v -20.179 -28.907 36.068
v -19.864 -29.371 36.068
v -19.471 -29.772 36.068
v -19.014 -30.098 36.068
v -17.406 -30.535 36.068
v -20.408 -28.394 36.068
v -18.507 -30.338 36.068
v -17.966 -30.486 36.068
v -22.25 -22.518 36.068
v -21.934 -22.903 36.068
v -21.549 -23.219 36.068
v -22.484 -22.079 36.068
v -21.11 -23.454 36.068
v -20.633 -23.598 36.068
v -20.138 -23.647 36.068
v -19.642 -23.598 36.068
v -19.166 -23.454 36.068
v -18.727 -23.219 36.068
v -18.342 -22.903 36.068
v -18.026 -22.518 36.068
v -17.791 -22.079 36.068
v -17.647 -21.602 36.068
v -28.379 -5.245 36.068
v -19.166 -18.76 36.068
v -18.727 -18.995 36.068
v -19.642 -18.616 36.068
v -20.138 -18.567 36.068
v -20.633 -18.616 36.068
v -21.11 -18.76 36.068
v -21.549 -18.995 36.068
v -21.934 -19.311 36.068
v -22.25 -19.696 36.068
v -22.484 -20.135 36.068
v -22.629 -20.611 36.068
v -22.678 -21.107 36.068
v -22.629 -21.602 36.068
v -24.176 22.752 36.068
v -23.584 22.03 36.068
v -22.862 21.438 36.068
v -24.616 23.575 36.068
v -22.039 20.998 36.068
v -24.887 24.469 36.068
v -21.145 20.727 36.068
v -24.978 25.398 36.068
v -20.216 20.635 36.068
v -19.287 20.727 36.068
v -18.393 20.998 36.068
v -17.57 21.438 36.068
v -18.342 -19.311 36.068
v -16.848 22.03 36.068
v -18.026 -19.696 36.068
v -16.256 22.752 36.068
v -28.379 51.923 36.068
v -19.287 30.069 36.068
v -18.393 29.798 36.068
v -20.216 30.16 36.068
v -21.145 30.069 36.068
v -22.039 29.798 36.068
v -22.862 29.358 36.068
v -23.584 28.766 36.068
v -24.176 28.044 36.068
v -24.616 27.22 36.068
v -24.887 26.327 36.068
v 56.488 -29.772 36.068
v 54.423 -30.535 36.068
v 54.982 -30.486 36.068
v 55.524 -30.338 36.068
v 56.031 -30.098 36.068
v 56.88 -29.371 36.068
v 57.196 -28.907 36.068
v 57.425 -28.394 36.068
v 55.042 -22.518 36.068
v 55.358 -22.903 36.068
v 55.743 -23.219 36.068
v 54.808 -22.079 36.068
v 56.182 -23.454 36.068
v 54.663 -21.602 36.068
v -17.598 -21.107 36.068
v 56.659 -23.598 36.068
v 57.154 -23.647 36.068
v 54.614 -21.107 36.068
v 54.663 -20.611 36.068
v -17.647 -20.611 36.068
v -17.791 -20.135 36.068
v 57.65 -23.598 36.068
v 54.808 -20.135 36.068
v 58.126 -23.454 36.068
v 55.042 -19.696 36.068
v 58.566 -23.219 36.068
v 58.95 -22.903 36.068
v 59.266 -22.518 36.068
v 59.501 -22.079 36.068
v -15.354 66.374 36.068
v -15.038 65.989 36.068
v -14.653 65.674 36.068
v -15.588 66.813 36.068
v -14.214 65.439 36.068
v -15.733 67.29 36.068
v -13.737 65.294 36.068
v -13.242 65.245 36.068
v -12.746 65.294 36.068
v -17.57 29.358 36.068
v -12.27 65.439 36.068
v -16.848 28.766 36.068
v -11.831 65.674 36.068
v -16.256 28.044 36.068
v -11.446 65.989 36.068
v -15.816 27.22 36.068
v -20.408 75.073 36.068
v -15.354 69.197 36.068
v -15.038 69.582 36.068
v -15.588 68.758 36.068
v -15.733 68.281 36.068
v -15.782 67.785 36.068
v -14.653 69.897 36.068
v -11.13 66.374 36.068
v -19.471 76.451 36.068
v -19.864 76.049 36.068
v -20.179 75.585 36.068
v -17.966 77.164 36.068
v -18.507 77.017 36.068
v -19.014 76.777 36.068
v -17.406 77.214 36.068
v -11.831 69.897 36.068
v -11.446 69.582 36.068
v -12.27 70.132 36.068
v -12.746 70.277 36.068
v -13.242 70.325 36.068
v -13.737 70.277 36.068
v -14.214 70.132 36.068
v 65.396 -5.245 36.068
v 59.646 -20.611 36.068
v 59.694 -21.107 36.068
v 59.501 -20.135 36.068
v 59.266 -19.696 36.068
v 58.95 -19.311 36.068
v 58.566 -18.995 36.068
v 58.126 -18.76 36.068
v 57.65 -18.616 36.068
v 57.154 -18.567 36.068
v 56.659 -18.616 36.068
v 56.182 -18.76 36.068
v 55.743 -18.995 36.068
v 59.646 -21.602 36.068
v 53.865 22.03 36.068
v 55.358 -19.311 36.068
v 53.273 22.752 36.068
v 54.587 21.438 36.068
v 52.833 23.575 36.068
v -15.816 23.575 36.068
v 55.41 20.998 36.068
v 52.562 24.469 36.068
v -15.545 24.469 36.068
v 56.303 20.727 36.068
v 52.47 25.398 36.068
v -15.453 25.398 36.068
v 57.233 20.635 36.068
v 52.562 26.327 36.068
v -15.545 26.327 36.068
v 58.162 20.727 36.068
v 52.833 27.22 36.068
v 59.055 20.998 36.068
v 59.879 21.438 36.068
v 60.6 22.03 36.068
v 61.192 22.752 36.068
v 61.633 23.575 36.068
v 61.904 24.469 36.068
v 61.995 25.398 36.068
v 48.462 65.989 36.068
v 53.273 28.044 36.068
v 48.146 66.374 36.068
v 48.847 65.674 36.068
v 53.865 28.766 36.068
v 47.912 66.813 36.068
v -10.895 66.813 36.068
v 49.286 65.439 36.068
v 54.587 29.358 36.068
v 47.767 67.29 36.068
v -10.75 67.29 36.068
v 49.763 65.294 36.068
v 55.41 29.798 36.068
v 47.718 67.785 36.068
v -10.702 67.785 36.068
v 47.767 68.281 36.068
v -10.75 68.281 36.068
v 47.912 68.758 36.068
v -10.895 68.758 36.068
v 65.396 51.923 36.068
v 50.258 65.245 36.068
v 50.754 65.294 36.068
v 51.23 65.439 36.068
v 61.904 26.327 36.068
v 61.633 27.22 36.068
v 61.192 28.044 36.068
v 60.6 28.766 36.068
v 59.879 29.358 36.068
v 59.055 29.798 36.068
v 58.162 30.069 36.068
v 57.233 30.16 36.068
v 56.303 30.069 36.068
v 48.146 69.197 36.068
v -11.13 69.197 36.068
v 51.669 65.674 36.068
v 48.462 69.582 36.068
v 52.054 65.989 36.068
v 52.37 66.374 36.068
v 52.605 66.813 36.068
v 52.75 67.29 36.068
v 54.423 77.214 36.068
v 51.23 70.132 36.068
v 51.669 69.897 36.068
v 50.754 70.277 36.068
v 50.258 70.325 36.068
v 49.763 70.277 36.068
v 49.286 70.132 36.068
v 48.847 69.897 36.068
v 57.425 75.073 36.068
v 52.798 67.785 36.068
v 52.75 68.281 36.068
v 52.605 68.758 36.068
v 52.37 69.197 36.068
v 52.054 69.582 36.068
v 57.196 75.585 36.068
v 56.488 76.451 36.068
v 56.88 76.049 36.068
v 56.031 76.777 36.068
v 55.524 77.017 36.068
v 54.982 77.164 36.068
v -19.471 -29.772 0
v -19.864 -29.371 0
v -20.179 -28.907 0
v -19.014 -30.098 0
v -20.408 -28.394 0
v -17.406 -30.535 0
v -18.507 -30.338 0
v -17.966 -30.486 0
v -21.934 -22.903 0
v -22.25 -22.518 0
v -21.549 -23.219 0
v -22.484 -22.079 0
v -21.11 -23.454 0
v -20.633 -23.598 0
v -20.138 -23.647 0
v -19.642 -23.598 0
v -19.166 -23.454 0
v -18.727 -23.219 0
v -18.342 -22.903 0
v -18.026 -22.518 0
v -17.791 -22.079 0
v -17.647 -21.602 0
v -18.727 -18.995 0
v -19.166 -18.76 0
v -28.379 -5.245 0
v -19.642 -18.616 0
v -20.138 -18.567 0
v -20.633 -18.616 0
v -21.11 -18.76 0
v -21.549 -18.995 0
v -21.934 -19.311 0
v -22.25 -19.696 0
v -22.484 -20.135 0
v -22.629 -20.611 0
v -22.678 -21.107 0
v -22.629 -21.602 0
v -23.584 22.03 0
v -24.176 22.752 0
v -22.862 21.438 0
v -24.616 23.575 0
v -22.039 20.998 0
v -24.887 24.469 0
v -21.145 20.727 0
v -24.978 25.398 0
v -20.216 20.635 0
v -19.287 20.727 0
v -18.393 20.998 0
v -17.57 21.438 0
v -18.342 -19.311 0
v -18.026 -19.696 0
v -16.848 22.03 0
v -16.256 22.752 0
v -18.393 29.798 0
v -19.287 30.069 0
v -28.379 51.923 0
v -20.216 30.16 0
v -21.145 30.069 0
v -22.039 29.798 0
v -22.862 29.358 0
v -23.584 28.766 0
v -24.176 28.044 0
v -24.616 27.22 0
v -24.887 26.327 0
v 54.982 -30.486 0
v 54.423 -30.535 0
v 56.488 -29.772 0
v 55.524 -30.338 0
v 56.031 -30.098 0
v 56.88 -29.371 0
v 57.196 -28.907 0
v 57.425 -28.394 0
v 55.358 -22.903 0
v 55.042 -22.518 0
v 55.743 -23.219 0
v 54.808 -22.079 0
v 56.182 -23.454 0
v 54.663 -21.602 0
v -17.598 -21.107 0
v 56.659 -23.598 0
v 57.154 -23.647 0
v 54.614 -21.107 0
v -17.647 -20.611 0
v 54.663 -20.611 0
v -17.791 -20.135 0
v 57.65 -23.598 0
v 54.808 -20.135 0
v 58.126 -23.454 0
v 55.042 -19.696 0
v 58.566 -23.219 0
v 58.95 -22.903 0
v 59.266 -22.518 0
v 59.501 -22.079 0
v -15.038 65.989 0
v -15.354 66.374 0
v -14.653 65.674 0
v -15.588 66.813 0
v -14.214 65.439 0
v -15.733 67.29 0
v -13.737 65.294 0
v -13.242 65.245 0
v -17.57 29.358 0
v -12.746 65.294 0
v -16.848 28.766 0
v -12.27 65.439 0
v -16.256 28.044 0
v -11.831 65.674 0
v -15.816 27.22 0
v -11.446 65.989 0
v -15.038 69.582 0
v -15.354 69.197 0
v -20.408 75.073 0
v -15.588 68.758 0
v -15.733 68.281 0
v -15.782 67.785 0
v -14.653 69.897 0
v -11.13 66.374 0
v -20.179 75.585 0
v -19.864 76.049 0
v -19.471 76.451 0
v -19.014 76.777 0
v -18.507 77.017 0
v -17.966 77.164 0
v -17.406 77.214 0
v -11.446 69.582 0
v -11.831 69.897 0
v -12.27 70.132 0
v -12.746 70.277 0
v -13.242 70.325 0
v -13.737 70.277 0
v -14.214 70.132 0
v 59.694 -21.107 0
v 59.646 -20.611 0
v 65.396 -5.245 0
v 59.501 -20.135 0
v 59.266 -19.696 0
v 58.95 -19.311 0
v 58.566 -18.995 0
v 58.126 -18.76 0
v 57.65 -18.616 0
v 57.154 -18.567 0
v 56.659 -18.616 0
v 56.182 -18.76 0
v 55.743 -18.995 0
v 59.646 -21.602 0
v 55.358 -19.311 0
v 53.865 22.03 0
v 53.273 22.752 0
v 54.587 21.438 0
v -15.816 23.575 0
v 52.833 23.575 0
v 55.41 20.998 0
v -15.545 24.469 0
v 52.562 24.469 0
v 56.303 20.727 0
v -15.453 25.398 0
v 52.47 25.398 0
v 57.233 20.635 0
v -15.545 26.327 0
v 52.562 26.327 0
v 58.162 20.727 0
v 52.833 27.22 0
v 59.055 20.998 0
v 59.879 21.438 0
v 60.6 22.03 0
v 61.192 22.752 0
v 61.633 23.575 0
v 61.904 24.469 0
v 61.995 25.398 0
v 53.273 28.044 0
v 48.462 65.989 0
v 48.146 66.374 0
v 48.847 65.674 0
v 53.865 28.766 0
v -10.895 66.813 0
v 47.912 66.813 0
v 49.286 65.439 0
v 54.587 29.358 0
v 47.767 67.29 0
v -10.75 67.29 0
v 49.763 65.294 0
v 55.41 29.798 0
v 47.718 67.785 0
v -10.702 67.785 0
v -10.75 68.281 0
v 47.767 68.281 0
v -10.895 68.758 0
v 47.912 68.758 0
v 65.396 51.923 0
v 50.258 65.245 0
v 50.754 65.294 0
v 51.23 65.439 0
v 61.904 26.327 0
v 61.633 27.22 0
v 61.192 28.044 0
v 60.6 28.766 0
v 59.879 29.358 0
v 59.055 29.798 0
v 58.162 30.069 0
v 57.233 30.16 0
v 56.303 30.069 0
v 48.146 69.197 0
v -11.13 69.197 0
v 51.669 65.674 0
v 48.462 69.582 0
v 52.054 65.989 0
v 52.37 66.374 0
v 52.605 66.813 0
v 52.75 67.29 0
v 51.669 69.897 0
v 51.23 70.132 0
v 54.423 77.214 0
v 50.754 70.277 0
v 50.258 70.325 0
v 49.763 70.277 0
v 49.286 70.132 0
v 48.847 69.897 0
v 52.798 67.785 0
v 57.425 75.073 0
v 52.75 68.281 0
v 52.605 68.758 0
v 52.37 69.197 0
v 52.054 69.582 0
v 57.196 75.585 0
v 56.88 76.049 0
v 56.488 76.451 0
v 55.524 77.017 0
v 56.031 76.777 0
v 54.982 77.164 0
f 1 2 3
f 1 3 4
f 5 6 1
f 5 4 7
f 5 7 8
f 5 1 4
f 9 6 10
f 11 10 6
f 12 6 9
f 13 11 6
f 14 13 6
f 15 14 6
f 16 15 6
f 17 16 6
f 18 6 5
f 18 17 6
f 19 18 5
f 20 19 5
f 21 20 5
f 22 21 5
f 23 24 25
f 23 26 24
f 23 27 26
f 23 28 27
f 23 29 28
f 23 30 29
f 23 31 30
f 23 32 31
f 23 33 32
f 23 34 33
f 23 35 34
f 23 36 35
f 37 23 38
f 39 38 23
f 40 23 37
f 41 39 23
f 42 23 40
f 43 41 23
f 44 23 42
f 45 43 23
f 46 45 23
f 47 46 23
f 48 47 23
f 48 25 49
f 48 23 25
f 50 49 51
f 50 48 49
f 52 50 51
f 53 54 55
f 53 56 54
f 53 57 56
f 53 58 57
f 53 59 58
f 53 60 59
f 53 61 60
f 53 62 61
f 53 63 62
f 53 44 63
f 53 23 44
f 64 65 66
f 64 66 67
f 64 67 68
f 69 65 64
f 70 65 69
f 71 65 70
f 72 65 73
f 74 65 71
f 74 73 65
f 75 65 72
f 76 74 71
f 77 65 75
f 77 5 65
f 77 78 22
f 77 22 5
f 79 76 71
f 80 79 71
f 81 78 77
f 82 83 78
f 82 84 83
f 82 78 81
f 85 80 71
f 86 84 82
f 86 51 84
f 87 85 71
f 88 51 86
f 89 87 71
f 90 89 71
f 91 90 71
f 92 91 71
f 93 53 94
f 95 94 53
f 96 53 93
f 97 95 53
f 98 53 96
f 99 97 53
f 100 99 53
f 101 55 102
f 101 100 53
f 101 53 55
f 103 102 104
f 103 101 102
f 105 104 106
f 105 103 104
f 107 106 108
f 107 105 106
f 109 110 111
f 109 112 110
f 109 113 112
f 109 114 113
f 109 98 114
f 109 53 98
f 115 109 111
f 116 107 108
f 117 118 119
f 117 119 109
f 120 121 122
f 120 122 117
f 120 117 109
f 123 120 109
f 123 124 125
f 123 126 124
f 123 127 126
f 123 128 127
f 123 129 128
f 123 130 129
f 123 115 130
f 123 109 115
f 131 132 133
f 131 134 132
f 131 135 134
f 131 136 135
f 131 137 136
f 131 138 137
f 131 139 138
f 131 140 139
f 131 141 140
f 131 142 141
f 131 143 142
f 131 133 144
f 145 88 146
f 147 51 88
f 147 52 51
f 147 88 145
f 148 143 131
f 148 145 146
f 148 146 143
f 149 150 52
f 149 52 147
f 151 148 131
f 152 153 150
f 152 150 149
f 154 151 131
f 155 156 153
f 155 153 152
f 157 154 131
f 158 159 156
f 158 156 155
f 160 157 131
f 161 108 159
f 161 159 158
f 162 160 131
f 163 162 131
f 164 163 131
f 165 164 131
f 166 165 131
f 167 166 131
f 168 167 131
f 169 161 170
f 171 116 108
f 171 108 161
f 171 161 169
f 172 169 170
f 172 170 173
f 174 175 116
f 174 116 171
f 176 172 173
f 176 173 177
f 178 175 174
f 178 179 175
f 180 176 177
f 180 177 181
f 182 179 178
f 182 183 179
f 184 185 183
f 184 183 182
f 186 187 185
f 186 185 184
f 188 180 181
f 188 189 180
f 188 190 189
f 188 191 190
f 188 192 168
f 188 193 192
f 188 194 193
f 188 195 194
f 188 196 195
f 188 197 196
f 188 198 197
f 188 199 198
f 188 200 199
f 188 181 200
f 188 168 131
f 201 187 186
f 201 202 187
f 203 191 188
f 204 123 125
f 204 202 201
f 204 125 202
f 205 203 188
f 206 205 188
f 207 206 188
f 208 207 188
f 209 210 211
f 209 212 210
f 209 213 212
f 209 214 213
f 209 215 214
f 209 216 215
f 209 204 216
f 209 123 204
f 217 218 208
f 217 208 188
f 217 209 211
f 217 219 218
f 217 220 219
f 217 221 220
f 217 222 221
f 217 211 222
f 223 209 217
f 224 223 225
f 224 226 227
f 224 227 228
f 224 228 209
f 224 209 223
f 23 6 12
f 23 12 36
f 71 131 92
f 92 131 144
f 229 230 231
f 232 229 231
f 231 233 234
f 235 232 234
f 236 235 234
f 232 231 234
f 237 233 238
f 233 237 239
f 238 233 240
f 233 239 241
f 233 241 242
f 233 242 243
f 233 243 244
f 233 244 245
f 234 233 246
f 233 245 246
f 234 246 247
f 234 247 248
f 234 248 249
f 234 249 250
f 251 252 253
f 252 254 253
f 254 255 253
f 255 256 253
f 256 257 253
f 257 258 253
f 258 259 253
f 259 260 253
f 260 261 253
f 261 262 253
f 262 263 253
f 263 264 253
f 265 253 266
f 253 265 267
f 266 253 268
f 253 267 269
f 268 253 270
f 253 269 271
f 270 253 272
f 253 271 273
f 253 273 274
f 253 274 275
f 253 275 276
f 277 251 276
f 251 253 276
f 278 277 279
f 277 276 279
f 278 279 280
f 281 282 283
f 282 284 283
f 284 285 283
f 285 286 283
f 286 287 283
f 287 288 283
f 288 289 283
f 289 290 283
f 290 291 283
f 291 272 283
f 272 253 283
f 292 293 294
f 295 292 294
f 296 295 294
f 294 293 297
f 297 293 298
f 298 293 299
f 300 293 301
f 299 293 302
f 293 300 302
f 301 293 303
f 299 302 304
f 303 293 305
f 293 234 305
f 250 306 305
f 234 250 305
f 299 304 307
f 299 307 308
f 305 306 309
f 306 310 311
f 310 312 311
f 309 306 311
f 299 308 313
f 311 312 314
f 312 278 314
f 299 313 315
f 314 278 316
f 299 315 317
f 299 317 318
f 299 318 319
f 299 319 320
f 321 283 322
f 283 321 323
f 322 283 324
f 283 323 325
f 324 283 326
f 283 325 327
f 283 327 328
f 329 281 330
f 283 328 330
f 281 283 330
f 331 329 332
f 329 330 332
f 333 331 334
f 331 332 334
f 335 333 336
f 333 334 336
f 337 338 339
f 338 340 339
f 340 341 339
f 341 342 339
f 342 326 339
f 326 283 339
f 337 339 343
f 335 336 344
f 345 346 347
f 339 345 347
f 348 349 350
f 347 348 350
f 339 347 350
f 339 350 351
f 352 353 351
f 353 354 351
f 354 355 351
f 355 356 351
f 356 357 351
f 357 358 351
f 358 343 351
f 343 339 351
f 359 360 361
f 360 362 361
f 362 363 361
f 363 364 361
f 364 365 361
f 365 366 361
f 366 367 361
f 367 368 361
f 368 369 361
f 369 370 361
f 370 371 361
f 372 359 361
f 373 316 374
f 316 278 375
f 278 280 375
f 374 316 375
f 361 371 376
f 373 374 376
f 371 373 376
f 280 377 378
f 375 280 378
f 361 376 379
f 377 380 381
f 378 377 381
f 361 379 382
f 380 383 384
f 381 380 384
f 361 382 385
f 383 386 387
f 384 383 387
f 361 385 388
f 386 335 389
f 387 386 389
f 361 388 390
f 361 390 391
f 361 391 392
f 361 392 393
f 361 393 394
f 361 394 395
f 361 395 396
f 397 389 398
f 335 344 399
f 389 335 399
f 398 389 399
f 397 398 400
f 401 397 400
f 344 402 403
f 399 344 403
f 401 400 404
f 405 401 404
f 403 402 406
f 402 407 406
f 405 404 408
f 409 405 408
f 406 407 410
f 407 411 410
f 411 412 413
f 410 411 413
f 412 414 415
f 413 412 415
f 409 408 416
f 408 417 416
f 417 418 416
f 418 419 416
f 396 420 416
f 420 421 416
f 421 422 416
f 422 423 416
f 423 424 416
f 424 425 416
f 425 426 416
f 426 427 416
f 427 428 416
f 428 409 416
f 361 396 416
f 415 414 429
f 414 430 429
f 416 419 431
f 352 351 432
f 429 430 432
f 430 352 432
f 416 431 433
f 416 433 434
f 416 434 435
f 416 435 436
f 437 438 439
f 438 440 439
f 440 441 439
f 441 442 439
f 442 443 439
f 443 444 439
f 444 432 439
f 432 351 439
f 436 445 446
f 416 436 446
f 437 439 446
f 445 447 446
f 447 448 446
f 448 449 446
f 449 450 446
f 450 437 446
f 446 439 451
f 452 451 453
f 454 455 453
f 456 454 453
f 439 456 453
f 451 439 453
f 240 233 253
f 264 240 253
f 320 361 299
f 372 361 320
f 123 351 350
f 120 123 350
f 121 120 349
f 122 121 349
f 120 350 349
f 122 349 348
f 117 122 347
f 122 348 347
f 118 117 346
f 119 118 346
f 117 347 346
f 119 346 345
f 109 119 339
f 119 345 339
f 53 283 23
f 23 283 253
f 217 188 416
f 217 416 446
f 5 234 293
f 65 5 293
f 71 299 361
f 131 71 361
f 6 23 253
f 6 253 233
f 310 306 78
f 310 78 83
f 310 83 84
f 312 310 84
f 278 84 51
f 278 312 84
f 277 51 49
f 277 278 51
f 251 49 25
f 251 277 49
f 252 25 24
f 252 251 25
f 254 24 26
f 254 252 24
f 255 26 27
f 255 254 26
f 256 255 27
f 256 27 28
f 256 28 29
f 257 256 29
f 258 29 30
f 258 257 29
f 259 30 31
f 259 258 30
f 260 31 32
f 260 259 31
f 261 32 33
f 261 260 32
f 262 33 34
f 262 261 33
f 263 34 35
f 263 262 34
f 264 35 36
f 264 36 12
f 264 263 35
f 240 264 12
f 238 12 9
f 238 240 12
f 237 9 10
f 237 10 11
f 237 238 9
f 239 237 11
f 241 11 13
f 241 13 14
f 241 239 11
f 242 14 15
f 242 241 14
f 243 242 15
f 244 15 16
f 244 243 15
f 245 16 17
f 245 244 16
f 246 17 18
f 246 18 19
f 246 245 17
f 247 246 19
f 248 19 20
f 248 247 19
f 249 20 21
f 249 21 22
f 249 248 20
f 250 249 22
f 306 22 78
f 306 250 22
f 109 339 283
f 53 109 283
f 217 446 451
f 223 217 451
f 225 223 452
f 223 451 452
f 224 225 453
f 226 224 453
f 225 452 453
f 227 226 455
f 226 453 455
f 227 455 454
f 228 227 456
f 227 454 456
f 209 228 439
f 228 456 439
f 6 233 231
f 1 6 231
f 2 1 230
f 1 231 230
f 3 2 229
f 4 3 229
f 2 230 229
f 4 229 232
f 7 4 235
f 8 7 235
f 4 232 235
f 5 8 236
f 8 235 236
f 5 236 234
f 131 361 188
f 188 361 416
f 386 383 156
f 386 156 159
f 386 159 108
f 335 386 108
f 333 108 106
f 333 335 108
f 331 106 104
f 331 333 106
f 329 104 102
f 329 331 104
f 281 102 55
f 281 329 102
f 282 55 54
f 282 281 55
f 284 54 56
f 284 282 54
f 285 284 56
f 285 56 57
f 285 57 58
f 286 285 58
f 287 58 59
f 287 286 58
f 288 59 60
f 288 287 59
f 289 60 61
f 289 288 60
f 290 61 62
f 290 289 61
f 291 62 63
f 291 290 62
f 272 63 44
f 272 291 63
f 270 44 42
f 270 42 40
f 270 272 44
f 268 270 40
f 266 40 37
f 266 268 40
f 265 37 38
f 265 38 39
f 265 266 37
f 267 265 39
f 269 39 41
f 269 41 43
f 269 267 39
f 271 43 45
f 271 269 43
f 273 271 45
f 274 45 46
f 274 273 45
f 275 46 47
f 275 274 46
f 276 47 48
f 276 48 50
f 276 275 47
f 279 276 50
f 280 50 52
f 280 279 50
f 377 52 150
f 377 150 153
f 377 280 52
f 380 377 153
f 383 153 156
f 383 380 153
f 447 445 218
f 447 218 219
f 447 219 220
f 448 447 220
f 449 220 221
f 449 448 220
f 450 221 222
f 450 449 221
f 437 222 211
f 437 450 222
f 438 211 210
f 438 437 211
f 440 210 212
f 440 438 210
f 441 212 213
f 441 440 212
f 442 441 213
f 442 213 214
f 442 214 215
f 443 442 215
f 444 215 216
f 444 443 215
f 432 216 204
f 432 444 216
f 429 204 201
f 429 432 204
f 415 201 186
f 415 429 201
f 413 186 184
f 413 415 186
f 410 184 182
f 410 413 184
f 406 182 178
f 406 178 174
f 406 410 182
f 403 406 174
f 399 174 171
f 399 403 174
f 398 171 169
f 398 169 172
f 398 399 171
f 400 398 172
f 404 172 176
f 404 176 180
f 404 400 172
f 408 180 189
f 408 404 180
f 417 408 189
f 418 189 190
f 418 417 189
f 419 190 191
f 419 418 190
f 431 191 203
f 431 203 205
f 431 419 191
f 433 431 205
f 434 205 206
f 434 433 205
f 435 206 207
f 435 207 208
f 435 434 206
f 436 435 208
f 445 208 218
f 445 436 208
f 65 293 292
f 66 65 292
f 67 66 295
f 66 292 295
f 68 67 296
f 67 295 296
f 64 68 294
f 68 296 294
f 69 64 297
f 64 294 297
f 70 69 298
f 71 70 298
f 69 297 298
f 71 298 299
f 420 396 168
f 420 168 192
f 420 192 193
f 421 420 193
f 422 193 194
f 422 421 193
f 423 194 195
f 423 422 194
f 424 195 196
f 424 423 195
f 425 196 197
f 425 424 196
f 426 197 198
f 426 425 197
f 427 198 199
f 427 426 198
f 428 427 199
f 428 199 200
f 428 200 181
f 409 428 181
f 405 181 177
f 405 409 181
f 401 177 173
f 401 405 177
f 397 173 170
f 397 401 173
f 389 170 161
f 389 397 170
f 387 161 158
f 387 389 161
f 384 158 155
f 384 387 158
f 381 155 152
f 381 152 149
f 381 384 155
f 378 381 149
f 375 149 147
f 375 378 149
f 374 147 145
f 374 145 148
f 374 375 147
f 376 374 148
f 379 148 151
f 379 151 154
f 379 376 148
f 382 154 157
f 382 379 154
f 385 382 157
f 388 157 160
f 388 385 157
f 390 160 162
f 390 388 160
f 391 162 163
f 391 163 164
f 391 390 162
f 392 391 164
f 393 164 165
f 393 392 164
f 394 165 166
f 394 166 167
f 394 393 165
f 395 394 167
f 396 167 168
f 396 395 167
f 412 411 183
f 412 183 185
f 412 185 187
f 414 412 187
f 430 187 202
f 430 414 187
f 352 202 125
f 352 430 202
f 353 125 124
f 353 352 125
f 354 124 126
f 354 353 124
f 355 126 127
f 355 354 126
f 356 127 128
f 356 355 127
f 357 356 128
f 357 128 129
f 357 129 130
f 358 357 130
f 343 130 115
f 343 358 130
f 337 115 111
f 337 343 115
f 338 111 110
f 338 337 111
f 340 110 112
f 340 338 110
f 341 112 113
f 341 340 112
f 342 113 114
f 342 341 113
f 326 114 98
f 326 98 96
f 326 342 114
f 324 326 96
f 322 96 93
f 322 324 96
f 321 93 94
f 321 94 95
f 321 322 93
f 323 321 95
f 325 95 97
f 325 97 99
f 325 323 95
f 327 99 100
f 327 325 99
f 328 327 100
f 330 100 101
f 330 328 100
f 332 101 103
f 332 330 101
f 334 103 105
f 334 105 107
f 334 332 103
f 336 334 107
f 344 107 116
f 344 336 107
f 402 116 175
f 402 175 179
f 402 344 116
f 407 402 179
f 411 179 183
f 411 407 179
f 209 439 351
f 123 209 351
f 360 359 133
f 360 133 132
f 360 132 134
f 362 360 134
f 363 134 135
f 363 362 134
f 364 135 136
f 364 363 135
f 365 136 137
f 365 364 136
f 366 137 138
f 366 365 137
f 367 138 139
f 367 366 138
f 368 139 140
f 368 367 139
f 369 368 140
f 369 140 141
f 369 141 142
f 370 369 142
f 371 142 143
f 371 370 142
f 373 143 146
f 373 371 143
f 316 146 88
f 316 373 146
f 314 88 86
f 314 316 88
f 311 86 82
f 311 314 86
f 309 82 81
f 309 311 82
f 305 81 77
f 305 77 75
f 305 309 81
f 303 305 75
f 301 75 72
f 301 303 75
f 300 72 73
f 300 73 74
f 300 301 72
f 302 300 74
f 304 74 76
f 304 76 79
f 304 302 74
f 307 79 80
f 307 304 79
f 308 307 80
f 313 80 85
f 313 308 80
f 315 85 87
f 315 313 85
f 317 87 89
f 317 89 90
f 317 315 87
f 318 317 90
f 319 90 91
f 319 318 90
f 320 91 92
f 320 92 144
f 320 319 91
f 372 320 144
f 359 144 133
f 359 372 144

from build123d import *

# Parameters (mm, degrees)
SKETCH1_R           = 2.54
SKETCH1_R_2         = 4.7625
BOSS_EXTRUDE1_DEPTH = 36.068


with BuildPart() as part:
    # Sketch1 → Boss-Extrude1 (new body)
    with BuildSketch(Plane.XY):
        with BuildLine():
            Line((65.395995047, 51.923287663), (57.425031933, 75.072645444))
            ThreePointArc((57.425031933, 75.072645444), (56.26674234, 76.623783324), (54.423010456, 77.213966553))
            Line((54.423010456, 77.213966553), (-17.406388387, 77.213966553))
            ThreePointArc((-17.406388387, 77.213966553), (-19.250120272, 76.623783324), (-20.408409865, 75.072645444))
            Line((-20.408409865, 75.072645444), (-28.379372979, 51.923287663))
            Line((-28.379372979, 51.923287663), (-28.379372979, -5.244694556))
            Line((-28.379372979, -5.244694556), (-20.408409865, -28.394052337))
            ThreePointArc((-20.408409865, -28.394052337), (-19.250120272, -29.945190218), (-17.406388387, -30.535373447))
            Line((-17.406388387, -30.535373447), (54.423010456, -30.535373447))
            ThreePointArc((54.423010456, -30.535373447), (56.26674234, -29.945190218), (57.425031933, -28.394052337))
            Line((57.425031933, -28.394052337), (65.395995047, -5.244694556))
            Line((65.395995047, -5.244694556), (65.395995047, 51.923287663))
        make_face()
        with Locations((-13.241688966, 67.785486553)):
            Circle(SKETCH1_R, mode=Mode.SUBTRACT)
        with Locations((50.258311034, 67.785486553)):
            Circle(SKETCH1_R, mode=Mode.SUBTRACT)
        with Locations((-20.137788966, -21.106893447)):
            Circle(SKETCH1_R, mode=Mode.SUBTRACT)
        with Locations((57.154411034, -21.106893447)):
            Circle(SKETCH1_R, mode=Mode.SUBTRACT)
        with Locations((-20.215986176, 25.397966553)):
            Circle(SKETCH1_R_2, mode=Mode.SUBTRACT)
        with Locations((57.232608244, 25.397966553)):
            Circle(SKETCH1_R_2, mode=Mode.SUBTRACT)
    extrude(amount=BOSS_EXTRUDE1_DEPTH)


solid = part.part
